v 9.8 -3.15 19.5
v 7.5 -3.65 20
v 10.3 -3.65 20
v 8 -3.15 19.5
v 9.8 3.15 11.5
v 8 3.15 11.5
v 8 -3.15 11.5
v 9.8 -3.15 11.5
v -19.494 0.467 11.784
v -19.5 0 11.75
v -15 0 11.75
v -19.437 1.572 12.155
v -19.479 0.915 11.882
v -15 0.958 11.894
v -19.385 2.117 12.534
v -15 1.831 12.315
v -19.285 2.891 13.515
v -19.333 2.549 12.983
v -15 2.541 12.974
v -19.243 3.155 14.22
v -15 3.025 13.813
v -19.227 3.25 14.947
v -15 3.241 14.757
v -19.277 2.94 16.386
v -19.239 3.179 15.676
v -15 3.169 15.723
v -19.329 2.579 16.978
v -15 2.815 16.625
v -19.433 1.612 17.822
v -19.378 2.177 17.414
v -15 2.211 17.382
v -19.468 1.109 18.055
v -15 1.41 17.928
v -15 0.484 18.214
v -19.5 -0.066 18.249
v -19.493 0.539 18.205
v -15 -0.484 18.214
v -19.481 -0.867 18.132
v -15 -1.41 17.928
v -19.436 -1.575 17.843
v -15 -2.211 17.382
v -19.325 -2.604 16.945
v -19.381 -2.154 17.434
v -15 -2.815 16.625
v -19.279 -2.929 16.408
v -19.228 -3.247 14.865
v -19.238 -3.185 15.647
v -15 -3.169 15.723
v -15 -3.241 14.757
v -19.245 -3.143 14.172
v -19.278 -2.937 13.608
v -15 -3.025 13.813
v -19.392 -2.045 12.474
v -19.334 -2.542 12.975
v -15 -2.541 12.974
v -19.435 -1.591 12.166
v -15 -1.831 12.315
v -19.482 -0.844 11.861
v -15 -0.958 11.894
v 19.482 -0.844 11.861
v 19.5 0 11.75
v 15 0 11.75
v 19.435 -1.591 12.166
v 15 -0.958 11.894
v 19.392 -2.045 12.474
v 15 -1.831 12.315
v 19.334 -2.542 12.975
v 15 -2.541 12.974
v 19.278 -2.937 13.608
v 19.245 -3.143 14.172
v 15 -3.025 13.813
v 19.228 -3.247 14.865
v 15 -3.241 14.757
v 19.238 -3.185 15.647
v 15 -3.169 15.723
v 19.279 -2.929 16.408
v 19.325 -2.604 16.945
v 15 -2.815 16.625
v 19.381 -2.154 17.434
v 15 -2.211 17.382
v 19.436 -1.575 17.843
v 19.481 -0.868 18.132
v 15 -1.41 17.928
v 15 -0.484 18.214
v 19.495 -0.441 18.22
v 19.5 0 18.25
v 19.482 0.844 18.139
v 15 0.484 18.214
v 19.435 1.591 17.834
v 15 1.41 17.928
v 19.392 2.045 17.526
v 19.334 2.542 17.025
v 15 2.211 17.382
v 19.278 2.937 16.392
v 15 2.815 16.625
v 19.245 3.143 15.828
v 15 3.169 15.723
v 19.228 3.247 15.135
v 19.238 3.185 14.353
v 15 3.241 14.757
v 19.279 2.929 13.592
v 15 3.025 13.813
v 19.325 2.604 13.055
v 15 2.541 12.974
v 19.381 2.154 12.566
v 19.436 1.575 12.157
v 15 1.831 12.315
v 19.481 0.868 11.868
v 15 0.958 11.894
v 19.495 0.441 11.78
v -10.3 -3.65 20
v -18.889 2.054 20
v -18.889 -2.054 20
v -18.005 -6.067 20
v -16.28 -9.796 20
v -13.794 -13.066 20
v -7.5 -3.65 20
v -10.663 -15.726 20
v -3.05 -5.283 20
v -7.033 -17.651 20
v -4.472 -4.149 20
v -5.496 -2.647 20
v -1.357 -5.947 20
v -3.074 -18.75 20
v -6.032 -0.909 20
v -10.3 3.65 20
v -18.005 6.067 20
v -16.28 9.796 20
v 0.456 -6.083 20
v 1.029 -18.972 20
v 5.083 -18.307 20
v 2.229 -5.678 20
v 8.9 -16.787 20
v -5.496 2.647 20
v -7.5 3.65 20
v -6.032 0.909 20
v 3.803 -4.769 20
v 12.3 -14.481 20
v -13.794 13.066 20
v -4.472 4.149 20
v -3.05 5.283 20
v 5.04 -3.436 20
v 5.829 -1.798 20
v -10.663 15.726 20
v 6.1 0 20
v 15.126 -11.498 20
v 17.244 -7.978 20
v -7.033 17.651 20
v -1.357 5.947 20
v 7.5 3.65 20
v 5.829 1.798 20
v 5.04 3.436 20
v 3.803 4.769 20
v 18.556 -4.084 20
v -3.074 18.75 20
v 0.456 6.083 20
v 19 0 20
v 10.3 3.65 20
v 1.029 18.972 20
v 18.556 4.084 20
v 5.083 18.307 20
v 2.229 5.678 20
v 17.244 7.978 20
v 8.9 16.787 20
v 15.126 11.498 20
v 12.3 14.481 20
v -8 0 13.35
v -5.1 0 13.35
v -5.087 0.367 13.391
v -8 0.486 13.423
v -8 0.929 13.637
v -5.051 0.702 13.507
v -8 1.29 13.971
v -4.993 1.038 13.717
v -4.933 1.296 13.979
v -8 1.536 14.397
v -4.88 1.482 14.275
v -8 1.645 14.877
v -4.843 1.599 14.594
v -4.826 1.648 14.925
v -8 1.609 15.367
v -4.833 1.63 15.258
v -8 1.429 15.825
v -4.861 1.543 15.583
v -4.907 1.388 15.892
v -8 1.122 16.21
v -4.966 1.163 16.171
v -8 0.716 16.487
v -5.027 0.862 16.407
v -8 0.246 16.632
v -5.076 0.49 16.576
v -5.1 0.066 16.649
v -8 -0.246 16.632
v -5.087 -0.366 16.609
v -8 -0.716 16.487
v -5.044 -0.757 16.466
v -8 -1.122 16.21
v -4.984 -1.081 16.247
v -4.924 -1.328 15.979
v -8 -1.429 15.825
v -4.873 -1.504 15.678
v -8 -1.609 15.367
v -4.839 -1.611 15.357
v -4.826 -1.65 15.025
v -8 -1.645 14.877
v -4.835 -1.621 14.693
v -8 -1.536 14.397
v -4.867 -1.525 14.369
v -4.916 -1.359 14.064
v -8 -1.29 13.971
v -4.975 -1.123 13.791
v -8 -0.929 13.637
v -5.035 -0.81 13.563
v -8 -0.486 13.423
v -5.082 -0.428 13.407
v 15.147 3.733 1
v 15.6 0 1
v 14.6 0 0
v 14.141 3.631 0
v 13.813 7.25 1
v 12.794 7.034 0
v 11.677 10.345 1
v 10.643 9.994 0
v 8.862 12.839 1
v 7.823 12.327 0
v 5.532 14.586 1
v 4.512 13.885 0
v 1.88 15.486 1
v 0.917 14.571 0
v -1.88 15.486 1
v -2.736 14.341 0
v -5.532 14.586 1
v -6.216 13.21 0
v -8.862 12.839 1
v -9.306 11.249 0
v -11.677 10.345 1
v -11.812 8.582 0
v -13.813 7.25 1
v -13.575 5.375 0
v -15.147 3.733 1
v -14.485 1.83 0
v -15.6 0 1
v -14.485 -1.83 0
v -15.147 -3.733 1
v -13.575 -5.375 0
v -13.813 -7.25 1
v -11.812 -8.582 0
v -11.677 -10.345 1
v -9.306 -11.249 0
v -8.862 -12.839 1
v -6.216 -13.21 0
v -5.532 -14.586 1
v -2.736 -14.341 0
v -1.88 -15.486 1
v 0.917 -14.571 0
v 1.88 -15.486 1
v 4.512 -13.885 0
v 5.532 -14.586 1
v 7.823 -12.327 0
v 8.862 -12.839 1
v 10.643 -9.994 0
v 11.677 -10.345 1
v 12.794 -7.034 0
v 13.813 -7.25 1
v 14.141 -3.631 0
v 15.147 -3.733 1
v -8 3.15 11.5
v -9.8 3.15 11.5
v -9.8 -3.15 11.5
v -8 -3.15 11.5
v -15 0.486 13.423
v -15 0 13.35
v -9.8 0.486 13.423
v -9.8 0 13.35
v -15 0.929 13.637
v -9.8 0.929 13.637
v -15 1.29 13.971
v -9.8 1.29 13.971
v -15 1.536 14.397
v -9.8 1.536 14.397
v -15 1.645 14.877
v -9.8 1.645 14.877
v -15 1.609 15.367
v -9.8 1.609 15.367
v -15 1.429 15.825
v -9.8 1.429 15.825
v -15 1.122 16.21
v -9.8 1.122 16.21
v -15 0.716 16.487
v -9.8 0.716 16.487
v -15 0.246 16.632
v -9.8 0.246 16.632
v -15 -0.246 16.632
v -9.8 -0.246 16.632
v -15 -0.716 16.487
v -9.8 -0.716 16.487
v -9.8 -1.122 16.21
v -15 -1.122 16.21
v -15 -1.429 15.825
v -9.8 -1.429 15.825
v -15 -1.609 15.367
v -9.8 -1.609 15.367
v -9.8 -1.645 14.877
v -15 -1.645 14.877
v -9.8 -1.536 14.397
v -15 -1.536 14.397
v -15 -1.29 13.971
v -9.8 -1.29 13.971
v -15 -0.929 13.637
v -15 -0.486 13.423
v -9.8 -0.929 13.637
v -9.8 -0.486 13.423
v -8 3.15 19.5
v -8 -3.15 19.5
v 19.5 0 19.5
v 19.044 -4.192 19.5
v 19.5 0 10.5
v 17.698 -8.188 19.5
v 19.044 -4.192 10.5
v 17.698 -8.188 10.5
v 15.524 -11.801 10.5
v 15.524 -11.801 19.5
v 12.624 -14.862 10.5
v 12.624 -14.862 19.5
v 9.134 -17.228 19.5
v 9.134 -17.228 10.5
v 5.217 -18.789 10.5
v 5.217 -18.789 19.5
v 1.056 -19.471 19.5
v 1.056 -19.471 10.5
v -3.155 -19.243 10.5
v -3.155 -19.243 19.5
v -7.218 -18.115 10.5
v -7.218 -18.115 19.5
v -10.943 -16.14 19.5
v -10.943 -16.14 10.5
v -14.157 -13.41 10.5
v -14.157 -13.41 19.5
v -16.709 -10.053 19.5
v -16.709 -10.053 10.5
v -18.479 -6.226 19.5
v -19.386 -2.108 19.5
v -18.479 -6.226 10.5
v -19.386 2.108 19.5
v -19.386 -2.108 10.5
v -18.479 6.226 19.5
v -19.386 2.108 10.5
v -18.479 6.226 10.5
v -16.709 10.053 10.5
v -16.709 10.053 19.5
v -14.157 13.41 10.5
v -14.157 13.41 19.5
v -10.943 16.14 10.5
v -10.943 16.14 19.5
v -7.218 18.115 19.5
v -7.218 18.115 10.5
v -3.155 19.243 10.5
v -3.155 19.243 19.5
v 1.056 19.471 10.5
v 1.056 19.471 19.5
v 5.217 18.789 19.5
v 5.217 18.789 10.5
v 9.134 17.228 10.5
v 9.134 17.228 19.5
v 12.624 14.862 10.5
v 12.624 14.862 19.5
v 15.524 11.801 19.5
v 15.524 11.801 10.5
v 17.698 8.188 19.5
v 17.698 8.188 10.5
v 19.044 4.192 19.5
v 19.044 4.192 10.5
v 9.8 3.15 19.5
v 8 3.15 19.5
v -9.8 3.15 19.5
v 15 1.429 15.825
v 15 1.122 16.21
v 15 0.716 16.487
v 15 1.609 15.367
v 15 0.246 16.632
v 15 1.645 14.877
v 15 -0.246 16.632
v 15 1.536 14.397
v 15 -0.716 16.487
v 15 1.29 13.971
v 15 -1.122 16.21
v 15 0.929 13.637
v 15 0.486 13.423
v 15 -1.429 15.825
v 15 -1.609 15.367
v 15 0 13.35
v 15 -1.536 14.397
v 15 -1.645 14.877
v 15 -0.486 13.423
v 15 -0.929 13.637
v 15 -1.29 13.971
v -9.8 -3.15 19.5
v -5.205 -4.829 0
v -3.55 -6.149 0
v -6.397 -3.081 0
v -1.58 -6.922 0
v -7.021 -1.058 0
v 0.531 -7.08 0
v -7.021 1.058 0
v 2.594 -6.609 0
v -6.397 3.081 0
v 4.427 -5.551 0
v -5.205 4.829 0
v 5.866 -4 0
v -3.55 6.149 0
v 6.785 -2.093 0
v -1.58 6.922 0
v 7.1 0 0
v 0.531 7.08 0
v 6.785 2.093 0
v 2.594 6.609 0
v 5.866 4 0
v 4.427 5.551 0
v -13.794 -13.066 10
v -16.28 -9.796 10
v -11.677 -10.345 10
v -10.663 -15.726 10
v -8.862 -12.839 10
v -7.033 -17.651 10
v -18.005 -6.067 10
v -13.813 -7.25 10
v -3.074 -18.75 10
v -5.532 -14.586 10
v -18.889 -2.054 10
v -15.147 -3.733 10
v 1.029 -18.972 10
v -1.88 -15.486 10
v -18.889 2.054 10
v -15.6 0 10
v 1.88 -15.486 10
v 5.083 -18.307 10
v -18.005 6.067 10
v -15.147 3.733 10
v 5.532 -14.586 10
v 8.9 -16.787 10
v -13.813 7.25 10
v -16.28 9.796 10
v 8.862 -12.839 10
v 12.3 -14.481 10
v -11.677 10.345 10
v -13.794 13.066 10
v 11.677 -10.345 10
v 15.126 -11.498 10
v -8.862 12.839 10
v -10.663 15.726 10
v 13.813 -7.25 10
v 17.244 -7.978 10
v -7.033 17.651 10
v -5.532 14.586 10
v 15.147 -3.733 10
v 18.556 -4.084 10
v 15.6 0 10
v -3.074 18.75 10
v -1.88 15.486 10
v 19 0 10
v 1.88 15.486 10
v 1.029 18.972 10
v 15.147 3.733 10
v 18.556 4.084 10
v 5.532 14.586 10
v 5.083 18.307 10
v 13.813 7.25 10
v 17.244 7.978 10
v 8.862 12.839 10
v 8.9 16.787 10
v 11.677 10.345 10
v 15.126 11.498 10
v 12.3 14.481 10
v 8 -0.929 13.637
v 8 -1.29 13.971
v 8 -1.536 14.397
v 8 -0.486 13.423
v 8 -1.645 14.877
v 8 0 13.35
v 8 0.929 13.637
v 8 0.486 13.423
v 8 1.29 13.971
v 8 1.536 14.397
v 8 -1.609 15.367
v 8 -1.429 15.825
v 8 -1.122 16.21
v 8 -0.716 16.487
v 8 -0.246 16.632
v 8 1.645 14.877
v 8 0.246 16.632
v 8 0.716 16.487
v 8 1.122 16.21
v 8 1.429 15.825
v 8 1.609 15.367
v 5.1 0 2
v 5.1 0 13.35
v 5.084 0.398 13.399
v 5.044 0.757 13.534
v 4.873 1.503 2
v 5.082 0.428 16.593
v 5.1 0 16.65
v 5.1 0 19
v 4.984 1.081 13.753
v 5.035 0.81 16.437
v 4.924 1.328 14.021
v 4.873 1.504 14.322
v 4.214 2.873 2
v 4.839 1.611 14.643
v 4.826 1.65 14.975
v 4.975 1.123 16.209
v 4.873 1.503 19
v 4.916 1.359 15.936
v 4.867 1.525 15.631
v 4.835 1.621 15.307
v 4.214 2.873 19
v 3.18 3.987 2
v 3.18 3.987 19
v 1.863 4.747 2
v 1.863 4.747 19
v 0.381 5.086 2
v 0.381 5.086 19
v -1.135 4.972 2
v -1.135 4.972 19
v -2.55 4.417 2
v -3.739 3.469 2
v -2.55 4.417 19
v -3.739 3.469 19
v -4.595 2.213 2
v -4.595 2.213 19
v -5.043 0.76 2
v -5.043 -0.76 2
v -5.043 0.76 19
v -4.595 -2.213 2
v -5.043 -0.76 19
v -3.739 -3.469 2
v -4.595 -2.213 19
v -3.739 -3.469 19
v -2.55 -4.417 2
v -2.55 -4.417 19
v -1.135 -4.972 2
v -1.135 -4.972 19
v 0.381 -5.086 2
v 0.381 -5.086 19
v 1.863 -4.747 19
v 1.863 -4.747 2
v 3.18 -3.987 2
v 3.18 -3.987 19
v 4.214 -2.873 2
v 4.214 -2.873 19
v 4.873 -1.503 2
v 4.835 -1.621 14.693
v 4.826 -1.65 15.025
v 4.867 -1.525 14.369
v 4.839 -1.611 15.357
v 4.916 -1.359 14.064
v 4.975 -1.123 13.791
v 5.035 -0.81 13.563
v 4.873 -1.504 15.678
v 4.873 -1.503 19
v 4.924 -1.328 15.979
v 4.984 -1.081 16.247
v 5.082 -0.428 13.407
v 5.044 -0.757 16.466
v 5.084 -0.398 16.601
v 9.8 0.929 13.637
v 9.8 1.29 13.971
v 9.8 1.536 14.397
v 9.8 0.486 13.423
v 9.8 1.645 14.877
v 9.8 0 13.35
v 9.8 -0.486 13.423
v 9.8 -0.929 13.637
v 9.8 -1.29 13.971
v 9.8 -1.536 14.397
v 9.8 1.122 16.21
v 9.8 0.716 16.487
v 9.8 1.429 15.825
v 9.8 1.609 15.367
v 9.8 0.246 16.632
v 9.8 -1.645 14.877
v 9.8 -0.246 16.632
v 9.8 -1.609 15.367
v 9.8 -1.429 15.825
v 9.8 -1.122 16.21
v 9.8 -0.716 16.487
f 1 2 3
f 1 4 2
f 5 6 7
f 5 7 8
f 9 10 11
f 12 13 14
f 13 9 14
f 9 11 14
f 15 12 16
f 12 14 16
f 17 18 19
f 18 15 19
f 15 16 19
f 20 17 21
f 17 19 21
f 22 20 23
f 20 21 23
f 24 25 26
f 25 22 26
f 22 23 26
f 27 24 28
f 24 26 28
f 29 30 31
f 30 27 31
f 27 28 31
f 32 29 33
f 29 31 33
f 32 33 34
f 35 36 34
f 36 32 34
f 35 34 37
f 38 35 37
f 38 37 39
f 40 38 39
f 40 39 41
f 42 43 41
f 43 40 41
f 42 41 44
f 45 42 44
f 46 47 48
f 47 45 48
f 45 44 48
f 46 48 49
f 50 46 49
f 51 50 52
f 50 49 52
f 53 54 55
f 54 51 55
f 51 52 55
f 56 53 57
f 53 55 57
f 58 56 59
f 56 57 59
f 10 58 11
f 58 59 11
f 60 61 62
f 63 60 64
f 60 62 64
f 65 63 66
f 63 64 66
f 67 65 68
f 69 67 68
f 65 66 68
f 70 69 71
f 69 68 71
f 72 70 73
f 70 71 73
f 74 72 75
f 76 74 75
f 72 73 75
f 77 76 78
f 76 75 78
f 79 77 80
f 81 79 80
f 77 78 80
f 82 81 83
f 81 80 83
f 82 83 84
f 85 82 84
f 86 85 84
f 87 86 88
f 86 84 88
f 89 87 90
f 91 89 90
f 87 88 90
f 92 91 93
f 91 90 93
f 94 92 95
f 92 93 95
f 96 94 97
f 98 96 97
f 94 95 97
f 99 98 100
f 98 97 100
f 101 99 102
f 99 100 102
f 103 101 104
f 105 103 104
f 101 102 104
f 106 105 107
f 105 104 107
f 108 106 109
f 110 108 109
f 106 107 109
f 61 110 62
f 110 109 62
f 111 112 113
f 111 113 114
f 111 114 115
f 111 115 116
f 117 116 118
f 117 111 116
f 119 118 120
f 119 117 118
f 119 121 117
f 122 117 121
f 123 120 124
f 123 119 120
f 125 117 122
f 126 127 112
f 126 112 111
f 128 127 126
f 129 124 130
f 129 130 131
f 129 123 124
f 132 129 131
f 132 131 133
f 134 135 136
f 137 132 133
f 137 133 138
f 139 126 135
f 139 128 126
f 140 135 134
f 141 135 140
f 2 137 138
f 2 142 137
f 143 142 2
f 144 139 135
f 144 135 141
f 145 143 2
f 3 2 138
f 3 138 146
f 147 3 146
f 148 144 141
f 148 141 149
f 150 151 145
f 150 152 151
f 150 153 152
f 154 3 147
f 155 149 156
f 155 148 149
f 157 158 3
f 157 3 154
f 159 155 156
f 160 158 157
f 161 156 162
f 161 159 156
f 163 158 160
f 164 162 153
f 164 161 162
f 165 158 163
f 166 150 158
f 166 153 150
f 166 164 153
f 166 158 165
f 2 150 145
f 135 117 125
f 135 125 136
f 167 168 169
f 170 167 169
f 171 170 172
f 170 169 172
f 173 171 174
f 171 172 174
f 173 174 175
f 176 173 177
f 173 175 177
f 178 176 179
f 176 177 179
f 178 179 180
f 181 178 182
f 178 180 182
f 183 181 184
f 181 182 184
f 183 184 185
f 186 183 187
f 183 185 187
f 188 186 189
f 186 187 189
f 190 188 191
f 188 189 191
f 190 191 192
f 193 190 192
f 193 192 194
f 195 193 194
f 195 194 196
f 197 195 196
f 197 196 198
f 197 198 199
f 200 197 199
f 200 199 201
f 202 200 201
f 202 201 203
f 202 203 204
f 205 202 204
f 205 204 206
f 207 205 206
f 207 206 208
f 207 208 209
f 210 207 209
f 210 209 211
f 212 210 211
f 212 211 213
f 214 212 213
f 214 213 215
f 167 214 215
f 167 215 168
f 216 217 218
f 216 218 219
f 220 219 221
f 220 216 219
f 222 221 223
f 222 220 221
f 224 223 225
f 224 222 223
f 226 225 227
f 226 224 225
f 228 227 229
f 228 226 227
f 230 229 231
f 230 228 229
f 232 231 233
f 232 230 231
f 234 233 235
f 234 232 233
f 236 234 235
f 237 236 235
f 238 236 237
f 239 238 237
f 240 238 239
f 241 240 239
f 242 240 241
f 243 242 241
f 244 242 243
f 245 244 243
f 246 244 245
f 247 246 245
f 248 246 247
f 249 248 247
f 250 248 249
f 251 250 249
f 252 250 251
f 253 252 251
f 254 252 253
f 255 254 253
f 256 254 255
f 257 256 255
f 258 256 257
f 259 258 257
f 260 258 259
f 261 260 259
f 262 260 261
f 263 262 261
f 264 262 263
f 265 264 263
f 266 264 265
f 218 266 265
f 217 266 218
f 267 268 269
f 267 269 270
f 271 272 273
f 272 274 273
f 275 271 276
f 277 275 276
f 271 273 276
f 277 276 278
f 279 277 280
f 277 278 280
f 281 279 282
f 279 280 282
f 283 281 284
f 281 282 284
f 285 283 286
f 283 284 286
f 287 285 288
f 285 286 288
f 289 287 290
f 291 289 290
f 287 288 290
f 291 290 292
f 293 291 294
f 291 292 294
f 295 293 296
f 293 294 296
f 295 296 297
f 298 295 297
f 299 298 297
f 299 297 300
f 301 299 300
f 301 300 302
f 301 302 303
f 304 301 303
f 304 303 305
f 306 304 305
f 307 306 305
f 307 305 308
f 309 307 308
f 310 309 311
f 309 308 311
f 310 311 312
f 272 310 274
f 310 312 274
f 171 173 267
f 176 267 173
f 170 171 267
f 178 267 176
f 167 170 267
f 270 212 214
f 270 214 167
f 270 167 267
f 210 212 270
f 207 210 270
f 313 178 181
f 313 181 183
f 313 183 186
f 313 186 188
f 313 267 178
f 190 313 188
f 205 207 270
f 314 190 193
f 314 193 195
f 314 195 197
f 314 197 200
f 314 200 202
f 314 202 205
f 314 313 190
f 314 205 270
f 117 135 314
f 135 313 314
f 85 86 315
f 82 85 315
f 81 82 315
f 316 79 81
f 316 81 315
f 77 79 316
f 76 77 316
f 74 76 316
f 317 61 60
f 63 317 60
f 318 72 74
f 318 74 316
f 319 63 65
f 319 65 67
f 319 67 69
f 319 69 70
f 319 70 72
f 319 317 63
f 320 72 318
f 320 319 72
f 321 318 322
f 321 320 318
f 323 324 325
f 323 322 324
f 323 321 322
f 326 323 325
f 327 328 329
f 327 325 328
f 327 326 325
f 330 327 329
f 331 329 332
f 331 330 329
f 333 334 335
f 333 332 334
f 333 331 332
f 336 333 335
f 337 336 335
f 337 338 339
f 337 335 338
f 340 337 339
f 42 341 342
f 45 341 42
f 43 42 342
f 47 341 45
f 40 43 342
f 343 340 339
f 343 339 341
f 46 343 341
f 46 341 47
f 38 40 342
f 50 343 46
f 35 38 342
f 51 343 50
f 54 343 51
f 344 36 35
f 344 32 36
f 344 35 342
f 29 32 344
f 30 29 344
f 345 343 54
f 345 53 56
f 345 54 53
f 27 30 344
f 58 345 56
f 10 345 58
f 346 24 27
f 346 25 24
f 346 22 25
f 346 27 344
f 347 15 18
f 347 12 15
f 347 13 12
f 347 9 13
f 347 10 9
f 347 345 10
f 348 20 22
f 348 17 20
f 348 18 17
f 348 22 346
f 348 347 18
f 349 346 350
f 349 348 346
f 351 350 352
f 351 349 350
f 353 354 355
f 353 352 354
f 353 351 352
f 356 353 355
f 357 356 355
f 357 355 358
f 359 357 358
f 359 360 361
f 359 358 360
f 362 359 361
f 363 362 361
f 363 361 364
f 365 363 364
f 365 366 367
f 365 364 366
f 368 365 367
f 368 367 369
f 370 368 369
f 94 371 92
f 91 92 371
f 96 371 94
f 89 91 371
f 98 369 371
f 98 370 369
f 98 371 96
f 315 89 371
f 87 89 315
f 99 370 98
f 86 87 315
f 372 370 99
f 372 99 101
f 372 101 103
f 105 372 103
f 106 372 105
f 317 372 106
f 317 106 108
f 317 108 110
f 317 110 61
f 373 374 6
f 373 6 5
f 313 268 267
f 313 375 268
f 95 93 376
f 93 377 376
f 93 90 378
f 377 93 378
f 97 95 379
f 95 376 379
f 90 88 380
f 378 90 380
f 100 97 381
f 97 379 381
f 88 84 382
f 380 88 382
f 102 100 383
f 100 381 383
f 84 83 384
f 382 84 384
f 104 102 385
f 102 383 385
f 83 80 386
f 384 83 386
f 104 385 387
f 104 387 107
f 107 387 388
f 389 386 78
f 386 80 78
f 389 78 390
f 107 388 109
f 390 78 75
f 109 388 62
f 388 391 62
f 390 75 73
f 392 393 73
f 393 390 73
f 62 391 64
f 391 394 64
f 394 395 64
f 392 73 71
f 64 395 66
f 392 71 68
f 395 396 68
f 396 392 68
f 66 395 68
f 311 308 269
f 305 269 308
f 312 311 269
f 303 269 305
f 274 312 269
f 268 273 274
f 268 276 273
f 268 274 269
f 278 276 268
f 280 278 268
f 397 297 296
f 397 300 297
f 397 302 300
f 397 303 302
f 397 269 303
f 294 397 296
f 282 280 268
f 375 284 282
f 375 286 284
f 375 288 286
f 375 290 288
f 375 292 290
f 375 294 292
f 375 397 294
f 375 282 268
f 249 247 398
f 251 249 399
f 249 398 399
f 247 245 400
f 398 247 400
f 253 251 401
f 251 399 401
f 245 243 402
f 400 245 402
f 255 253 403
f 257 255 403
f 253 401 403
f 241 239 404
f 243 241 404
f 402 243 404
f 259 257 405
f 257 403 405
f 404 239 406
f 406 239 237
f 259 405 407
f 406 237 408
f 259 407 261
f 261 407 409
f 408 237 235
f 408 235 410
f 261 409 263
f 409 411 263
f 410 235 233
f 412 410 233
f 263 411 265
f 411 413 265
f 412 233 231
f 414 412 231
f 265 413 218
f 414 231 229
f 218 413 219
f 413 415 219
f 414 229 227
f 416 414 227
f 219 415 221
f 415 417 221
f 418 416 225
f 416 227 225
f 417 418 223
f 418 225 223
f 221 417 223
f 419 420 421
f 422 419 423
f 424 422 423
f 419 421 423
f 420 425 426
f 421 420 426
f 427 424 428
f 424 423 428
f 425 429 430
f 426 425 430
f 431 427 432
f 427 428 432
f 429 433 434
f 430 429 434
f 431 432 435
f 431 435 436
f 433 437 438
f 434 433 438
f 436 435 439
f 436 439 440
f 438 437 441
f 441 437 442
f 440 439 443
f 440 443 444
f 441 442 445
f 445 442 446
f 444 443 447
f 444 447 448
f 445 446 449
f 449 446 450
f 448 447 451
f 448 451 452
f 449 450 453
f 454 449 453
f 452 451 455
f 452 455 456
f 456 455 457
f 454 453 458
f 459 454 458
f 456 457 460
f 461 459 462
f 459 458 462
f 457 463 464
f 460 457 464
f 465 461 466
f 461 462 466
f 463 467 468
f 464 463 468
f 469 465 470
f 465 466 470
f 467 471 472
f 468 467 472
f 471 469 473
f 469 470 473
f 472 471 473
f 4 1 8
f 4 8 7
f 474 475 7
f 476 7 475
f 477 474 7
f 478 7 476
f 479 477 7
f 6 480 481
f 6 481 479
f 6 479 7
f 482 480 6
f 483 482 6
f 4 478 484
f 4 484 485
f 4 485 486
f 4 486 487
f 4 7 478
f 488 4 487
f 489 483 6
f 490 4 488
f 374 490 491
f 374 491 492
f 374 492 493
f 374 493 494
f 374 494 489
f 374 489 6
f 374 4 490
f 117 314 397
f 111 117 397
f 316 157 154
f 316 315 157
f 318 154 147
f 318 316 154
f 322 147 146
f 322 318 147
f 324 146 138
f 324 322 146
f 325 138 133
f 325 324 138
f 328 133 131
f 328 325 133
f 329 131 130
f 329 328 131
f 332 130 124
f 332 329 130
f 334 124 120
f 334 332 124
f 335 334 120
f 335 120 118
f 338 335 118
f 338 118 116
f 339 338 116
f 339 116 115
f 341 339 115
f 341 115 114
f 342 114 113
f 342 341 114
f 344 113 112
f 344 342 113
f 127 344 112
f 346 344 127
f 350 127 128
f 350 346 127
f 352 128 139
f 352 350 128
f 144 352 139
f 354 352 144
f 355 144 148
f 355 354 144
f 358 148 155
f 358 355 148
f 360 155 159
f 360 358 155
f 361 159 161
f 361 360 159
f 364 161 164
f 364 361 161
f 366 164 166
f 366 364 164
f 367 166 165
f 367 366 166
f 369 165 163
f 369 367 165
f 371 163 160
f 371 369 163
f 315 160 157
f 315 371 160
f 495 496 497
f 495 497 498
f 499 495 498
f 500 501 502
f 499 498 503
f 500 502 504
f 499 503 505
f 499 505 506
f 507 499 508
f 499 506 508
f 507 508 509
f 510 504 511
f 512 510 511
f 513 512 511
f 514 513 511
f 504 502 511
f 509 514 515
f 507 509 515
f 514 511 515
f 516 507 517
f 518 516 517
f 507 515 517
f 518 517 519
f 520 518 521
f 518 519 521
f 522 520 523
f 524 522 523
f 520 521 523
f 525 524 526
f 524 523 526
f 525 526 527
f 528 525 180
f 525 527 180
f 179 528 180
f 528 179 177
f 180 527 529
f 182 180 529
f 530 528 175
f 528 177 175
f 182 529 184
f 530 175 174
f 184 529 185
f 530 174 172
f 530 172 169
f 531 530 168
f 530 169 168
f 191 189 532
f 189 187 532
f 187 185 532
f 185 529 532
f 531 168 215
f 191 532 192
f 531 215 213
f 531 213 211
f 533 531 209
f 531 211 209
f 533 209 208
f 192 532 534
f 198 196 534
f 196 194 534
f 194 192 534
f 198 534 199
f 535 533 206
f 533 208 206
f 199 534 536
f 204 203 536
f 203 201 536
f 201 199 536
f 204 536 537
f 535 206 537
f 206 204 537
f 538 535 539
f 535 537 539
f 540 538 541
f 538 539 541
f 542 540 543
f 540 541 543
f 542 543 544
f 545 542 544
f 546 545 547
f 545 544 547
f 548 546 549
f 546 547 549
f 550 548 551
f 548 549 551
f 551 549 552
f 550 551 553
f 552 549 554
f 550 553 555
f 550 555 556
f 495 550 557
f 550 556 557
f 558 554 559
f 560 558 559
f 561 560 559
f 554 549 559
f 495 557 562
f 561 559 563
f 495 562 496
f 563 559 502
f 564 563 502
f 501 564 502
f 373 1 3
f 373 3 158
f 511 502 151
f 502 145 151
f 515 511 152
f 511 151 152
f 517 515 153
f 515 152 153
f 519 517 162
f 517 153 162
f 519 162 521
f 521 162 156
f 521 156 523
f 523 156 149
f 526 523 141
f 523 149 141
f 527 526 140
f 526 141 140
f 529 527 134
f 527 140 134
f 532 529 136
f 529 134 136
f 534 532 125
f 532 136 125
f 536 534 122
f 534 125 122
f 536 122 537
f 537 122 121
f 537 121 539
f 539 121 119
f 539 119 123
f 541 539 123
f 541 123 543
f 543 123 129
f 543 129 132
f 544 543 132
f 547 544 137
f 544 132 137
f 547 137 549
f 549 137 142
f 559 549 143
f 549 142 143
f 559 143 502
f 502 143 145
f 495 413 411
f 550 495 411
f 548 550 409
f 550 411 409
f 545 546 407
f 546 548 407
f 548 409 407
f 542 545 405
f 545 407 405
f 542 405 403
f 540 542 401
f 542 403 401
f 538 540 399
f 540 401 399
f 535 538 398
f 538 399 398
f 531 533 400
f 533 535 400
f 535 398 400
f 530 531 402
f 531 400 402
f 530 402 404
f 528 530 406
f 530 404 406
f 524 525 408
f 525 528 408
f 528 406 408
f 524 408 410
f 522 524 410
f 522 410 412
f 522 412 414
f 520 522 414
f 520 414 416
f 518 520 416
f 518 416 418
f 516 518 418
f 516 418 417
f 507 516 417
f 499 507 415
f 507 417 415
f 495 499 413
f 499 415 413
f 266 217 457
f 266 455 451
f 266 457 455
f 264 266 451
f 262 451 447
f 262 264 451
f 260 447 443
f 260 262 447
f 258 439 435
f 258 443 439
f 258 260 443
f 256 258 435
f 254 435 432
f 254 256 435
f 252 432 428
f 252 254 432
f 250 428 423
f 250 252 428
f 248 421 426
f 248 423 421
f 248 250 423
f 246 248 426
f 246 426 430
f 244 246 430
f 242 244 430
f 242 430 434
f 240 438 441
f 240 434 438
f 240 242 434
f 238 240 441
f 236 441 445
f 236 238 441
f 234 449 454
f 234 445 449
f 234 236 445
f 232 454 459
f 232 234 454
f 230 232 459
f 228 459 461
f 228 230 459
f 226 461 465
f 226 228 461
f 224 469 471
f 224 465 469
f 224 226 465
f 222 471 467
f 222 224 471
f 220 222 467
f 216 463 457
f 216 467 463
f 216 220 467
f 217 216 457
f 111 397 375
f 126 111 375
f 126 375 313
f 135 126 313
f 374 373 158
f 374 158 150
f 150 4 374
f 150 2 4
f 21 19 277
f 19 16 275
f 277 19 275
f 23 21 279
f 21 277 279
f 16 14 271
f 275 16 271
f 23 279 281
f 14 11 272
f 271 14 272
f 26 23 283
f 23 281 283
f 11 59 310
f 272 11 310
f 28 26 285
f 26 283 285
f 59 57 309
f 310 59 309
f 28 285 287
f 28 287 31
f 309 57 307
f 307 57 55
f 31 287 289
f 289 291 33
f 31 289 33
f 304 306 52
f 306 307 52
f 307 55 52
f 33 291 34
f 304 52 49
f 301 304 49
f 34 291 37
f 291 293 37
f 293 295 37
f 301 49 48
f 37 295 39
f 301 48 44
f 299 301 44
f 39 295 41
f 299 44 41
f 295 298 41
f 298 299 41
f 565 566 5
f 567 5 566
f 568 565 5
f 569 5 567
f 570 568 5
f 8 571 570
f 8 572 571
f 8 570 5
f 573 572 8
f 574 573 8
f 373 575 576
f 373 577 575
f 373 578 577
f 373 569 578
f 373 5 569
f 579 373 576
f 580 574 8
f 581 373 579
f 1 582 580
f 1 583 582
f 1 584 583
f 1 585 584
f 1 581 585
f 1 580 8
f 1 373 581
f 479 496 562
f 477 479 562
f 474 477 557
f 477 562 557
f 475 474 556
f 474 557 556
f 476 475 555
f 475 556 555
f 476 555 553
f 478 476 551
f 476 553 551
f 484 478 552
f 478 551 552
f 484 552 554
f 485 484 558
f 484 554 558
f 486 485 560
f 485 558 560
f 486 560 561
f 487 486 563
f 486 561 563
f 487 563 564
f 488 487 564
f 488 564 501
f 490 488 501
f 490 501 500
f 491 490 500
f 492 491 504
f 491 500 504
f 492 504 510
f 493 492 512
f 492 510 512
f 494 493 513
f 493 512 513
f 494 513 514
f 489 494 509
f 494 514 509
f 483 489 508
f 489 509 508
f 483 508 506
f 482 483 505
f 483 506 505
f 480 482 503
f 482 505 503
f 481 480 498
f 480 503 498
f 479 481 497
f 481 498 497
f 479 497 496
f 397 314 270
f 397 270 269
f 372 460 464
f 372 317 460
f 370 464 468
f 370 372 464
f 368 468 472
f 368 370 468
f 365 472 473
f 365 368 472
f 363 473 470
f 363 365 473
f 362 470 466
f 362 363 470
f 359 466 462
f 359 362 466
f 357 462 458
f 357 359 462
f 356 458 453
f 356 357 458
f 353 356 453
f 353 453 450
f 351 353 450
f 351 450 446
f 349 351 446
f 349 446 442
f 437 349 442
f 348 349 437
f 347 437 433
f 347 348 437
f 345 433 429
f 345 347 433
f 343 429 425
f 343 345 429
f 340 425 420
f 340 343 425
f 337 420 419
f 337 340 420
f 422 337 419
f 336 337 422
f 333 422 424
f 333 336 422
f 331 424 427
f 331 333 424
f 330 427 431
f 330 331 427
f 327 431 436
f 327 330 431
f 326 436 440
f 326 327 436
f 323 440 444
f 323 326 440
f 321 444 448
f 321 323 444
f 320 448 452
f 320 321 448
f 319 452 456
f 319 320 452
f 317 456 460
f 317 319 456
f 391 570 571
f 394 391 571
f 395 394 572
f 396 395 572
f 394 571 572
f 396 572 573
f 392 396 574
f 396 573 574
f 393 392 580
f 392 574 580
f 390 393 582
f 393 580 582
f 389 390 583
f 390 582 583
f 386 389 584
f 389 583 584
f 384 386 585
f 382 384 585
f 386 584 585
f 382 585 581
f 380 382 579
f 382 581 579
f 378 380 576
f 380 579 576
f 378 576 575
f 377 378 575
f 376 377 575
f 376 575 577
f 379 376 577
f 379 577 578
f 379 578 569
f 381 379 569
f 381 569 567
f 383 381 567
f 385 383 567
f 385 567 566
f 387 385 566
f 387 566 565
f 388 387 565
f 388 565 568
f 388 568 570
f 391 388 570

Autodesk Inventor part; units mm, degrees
ref_plane "XZ Plane" through (0, 0, 0) normal (0, 1, 0) x (-1, 0, 0)
ref_plane "XY Plane" through (0, 0, 0) normal (0, 0, 1) x (1, 0, 0)
sketch "スケッチ1" plane through (0, 0, 0) normal (0, 0, 1) x (1, 0, 0)
  circle A0 centre (0, 0) radius 15.6
  dimension "d0" = 31.2
extrude "押し出し1" add sketch "スケッチ1" along normal blind 10
sketch "スケッチ2" plane through (0, 0, 10) normal (0, 0, 1) x (1, 0, 0)
  circle A0 centre (0, 0) radius 15.6 projected
  circle A1 centre (0, 0) radius 19.5
  dimension "d3" = 39
extrude "押し出し2" add sketch "スケッチ2" along normal blind 10 contours A0 | A1
chamfer "面取り1" distance 1 angle 45 1 edges at (-15.6, 0, 0)
chamfer "面取り2" distance 0.5 angle 45 2 edges at (-19.5, 0, 20) (-19.5, 0, 10)
sketch "スケッチ3" plane through (0, 0, 20) normal (0, 0, 1) x (1, 0, 0)
  circle A0 centre (0, 0) radius 19 projected
  circle A1 centre (0, 0) radius 5.1
  dimension "d12" = 10.2
extrude "押し出し3" cut sketch "スケッチ3" against normal through all contours A1
chamfer "面取り3" distance 1 angle 45 1 edges at (-5.1, 0, 20)
ref_plane "作業平面1" through (20, 0, 0) normal (1, 0, 0) x (0, 1, 0)
sketch "スケッチ4" plane through (20, 0, 0) normal (1, 0, 0) x (0, 1, 0)
  line L0 (19.5, 19.5) -> (-19.5, 19.5) projected
  line L1 (-19.5, 10.5) -> (19.5, 10.5) projected
  line L2 (-19, 20) -> (19, 20) projected
  point P0 (0, 0)
  point P1 (0, 15)
  dimension "d44" = 5
hole "穴1" at (20, 0, 15) direction (-1, 0, 0) diameter 3.3 depth 17.75 tip angle 118
sketch "スケッチ5" plane through (20, 0, 0) normal (1, 0, 0) x (0, 1, 0)
  line L0 (-19.5, 10.5) -> (19.5, 10.5) projected
  line L1 (19.5, 19.5) -> (-19.5, 19.5) projected
  line L2 (-19, 20) -> (19, 20) projected
  point P0 (0, 0)
  point P1 (1.65, 15)
  point P2 (0, 15)
  point P3 (-1.65, 15)
  point P4 (1.65, 15)
  dimension "d45" = 5
hole "穴2" at (20, 0, 15) direction (-1, 0, 0) diameter 6.5 depth 5
sketch "スケッチ6" plane through (0, 0, 20) normal (0, 0, 1) x (1, 0, 0)
  circle A0 centre (0, 0) radius 19 projected
  line L0 (8, 3.15) -> (9.8, 3.15)
  line L1 (9.8, 3.15) -> (9.8, -3.15)
  line L2 (9.8, -3.15) -> (8, -3.15)
  line L3 (8, -3.15) -> (8, 3.15)
  dimension "d34" = 1.8
  dimension "d35" = 6.3
  dimension "d36" = 3.15
  dimension "d37" = 8
extrude "押し出し4" cut sketch "スケッチ6" against normal blind 8.5 contours L0 L1 L2 L3
mirror "ミラー1" about plane through (0, 0, 0) normal (1, 0, 0) of "穴2", "穴1", "押し出し4"
chamfer "面取り4" distance 2 angle 45 1 edges at (-5.1, 0, 0)
chamfer "面取り5" distance 0.5 angle 45 8 edges at (9.8, 0, 20) (8, 0, 20) (8.9, -3.15, 20) (8.9, 3.15, 20) (-8.9, 3.15, 20) (-8.9, -3.15, 20) (-9.8, 0, 20) (-8, 0, 20)
properties part number "Print_Parts_A1" material "PC/ABS プラスチック"
